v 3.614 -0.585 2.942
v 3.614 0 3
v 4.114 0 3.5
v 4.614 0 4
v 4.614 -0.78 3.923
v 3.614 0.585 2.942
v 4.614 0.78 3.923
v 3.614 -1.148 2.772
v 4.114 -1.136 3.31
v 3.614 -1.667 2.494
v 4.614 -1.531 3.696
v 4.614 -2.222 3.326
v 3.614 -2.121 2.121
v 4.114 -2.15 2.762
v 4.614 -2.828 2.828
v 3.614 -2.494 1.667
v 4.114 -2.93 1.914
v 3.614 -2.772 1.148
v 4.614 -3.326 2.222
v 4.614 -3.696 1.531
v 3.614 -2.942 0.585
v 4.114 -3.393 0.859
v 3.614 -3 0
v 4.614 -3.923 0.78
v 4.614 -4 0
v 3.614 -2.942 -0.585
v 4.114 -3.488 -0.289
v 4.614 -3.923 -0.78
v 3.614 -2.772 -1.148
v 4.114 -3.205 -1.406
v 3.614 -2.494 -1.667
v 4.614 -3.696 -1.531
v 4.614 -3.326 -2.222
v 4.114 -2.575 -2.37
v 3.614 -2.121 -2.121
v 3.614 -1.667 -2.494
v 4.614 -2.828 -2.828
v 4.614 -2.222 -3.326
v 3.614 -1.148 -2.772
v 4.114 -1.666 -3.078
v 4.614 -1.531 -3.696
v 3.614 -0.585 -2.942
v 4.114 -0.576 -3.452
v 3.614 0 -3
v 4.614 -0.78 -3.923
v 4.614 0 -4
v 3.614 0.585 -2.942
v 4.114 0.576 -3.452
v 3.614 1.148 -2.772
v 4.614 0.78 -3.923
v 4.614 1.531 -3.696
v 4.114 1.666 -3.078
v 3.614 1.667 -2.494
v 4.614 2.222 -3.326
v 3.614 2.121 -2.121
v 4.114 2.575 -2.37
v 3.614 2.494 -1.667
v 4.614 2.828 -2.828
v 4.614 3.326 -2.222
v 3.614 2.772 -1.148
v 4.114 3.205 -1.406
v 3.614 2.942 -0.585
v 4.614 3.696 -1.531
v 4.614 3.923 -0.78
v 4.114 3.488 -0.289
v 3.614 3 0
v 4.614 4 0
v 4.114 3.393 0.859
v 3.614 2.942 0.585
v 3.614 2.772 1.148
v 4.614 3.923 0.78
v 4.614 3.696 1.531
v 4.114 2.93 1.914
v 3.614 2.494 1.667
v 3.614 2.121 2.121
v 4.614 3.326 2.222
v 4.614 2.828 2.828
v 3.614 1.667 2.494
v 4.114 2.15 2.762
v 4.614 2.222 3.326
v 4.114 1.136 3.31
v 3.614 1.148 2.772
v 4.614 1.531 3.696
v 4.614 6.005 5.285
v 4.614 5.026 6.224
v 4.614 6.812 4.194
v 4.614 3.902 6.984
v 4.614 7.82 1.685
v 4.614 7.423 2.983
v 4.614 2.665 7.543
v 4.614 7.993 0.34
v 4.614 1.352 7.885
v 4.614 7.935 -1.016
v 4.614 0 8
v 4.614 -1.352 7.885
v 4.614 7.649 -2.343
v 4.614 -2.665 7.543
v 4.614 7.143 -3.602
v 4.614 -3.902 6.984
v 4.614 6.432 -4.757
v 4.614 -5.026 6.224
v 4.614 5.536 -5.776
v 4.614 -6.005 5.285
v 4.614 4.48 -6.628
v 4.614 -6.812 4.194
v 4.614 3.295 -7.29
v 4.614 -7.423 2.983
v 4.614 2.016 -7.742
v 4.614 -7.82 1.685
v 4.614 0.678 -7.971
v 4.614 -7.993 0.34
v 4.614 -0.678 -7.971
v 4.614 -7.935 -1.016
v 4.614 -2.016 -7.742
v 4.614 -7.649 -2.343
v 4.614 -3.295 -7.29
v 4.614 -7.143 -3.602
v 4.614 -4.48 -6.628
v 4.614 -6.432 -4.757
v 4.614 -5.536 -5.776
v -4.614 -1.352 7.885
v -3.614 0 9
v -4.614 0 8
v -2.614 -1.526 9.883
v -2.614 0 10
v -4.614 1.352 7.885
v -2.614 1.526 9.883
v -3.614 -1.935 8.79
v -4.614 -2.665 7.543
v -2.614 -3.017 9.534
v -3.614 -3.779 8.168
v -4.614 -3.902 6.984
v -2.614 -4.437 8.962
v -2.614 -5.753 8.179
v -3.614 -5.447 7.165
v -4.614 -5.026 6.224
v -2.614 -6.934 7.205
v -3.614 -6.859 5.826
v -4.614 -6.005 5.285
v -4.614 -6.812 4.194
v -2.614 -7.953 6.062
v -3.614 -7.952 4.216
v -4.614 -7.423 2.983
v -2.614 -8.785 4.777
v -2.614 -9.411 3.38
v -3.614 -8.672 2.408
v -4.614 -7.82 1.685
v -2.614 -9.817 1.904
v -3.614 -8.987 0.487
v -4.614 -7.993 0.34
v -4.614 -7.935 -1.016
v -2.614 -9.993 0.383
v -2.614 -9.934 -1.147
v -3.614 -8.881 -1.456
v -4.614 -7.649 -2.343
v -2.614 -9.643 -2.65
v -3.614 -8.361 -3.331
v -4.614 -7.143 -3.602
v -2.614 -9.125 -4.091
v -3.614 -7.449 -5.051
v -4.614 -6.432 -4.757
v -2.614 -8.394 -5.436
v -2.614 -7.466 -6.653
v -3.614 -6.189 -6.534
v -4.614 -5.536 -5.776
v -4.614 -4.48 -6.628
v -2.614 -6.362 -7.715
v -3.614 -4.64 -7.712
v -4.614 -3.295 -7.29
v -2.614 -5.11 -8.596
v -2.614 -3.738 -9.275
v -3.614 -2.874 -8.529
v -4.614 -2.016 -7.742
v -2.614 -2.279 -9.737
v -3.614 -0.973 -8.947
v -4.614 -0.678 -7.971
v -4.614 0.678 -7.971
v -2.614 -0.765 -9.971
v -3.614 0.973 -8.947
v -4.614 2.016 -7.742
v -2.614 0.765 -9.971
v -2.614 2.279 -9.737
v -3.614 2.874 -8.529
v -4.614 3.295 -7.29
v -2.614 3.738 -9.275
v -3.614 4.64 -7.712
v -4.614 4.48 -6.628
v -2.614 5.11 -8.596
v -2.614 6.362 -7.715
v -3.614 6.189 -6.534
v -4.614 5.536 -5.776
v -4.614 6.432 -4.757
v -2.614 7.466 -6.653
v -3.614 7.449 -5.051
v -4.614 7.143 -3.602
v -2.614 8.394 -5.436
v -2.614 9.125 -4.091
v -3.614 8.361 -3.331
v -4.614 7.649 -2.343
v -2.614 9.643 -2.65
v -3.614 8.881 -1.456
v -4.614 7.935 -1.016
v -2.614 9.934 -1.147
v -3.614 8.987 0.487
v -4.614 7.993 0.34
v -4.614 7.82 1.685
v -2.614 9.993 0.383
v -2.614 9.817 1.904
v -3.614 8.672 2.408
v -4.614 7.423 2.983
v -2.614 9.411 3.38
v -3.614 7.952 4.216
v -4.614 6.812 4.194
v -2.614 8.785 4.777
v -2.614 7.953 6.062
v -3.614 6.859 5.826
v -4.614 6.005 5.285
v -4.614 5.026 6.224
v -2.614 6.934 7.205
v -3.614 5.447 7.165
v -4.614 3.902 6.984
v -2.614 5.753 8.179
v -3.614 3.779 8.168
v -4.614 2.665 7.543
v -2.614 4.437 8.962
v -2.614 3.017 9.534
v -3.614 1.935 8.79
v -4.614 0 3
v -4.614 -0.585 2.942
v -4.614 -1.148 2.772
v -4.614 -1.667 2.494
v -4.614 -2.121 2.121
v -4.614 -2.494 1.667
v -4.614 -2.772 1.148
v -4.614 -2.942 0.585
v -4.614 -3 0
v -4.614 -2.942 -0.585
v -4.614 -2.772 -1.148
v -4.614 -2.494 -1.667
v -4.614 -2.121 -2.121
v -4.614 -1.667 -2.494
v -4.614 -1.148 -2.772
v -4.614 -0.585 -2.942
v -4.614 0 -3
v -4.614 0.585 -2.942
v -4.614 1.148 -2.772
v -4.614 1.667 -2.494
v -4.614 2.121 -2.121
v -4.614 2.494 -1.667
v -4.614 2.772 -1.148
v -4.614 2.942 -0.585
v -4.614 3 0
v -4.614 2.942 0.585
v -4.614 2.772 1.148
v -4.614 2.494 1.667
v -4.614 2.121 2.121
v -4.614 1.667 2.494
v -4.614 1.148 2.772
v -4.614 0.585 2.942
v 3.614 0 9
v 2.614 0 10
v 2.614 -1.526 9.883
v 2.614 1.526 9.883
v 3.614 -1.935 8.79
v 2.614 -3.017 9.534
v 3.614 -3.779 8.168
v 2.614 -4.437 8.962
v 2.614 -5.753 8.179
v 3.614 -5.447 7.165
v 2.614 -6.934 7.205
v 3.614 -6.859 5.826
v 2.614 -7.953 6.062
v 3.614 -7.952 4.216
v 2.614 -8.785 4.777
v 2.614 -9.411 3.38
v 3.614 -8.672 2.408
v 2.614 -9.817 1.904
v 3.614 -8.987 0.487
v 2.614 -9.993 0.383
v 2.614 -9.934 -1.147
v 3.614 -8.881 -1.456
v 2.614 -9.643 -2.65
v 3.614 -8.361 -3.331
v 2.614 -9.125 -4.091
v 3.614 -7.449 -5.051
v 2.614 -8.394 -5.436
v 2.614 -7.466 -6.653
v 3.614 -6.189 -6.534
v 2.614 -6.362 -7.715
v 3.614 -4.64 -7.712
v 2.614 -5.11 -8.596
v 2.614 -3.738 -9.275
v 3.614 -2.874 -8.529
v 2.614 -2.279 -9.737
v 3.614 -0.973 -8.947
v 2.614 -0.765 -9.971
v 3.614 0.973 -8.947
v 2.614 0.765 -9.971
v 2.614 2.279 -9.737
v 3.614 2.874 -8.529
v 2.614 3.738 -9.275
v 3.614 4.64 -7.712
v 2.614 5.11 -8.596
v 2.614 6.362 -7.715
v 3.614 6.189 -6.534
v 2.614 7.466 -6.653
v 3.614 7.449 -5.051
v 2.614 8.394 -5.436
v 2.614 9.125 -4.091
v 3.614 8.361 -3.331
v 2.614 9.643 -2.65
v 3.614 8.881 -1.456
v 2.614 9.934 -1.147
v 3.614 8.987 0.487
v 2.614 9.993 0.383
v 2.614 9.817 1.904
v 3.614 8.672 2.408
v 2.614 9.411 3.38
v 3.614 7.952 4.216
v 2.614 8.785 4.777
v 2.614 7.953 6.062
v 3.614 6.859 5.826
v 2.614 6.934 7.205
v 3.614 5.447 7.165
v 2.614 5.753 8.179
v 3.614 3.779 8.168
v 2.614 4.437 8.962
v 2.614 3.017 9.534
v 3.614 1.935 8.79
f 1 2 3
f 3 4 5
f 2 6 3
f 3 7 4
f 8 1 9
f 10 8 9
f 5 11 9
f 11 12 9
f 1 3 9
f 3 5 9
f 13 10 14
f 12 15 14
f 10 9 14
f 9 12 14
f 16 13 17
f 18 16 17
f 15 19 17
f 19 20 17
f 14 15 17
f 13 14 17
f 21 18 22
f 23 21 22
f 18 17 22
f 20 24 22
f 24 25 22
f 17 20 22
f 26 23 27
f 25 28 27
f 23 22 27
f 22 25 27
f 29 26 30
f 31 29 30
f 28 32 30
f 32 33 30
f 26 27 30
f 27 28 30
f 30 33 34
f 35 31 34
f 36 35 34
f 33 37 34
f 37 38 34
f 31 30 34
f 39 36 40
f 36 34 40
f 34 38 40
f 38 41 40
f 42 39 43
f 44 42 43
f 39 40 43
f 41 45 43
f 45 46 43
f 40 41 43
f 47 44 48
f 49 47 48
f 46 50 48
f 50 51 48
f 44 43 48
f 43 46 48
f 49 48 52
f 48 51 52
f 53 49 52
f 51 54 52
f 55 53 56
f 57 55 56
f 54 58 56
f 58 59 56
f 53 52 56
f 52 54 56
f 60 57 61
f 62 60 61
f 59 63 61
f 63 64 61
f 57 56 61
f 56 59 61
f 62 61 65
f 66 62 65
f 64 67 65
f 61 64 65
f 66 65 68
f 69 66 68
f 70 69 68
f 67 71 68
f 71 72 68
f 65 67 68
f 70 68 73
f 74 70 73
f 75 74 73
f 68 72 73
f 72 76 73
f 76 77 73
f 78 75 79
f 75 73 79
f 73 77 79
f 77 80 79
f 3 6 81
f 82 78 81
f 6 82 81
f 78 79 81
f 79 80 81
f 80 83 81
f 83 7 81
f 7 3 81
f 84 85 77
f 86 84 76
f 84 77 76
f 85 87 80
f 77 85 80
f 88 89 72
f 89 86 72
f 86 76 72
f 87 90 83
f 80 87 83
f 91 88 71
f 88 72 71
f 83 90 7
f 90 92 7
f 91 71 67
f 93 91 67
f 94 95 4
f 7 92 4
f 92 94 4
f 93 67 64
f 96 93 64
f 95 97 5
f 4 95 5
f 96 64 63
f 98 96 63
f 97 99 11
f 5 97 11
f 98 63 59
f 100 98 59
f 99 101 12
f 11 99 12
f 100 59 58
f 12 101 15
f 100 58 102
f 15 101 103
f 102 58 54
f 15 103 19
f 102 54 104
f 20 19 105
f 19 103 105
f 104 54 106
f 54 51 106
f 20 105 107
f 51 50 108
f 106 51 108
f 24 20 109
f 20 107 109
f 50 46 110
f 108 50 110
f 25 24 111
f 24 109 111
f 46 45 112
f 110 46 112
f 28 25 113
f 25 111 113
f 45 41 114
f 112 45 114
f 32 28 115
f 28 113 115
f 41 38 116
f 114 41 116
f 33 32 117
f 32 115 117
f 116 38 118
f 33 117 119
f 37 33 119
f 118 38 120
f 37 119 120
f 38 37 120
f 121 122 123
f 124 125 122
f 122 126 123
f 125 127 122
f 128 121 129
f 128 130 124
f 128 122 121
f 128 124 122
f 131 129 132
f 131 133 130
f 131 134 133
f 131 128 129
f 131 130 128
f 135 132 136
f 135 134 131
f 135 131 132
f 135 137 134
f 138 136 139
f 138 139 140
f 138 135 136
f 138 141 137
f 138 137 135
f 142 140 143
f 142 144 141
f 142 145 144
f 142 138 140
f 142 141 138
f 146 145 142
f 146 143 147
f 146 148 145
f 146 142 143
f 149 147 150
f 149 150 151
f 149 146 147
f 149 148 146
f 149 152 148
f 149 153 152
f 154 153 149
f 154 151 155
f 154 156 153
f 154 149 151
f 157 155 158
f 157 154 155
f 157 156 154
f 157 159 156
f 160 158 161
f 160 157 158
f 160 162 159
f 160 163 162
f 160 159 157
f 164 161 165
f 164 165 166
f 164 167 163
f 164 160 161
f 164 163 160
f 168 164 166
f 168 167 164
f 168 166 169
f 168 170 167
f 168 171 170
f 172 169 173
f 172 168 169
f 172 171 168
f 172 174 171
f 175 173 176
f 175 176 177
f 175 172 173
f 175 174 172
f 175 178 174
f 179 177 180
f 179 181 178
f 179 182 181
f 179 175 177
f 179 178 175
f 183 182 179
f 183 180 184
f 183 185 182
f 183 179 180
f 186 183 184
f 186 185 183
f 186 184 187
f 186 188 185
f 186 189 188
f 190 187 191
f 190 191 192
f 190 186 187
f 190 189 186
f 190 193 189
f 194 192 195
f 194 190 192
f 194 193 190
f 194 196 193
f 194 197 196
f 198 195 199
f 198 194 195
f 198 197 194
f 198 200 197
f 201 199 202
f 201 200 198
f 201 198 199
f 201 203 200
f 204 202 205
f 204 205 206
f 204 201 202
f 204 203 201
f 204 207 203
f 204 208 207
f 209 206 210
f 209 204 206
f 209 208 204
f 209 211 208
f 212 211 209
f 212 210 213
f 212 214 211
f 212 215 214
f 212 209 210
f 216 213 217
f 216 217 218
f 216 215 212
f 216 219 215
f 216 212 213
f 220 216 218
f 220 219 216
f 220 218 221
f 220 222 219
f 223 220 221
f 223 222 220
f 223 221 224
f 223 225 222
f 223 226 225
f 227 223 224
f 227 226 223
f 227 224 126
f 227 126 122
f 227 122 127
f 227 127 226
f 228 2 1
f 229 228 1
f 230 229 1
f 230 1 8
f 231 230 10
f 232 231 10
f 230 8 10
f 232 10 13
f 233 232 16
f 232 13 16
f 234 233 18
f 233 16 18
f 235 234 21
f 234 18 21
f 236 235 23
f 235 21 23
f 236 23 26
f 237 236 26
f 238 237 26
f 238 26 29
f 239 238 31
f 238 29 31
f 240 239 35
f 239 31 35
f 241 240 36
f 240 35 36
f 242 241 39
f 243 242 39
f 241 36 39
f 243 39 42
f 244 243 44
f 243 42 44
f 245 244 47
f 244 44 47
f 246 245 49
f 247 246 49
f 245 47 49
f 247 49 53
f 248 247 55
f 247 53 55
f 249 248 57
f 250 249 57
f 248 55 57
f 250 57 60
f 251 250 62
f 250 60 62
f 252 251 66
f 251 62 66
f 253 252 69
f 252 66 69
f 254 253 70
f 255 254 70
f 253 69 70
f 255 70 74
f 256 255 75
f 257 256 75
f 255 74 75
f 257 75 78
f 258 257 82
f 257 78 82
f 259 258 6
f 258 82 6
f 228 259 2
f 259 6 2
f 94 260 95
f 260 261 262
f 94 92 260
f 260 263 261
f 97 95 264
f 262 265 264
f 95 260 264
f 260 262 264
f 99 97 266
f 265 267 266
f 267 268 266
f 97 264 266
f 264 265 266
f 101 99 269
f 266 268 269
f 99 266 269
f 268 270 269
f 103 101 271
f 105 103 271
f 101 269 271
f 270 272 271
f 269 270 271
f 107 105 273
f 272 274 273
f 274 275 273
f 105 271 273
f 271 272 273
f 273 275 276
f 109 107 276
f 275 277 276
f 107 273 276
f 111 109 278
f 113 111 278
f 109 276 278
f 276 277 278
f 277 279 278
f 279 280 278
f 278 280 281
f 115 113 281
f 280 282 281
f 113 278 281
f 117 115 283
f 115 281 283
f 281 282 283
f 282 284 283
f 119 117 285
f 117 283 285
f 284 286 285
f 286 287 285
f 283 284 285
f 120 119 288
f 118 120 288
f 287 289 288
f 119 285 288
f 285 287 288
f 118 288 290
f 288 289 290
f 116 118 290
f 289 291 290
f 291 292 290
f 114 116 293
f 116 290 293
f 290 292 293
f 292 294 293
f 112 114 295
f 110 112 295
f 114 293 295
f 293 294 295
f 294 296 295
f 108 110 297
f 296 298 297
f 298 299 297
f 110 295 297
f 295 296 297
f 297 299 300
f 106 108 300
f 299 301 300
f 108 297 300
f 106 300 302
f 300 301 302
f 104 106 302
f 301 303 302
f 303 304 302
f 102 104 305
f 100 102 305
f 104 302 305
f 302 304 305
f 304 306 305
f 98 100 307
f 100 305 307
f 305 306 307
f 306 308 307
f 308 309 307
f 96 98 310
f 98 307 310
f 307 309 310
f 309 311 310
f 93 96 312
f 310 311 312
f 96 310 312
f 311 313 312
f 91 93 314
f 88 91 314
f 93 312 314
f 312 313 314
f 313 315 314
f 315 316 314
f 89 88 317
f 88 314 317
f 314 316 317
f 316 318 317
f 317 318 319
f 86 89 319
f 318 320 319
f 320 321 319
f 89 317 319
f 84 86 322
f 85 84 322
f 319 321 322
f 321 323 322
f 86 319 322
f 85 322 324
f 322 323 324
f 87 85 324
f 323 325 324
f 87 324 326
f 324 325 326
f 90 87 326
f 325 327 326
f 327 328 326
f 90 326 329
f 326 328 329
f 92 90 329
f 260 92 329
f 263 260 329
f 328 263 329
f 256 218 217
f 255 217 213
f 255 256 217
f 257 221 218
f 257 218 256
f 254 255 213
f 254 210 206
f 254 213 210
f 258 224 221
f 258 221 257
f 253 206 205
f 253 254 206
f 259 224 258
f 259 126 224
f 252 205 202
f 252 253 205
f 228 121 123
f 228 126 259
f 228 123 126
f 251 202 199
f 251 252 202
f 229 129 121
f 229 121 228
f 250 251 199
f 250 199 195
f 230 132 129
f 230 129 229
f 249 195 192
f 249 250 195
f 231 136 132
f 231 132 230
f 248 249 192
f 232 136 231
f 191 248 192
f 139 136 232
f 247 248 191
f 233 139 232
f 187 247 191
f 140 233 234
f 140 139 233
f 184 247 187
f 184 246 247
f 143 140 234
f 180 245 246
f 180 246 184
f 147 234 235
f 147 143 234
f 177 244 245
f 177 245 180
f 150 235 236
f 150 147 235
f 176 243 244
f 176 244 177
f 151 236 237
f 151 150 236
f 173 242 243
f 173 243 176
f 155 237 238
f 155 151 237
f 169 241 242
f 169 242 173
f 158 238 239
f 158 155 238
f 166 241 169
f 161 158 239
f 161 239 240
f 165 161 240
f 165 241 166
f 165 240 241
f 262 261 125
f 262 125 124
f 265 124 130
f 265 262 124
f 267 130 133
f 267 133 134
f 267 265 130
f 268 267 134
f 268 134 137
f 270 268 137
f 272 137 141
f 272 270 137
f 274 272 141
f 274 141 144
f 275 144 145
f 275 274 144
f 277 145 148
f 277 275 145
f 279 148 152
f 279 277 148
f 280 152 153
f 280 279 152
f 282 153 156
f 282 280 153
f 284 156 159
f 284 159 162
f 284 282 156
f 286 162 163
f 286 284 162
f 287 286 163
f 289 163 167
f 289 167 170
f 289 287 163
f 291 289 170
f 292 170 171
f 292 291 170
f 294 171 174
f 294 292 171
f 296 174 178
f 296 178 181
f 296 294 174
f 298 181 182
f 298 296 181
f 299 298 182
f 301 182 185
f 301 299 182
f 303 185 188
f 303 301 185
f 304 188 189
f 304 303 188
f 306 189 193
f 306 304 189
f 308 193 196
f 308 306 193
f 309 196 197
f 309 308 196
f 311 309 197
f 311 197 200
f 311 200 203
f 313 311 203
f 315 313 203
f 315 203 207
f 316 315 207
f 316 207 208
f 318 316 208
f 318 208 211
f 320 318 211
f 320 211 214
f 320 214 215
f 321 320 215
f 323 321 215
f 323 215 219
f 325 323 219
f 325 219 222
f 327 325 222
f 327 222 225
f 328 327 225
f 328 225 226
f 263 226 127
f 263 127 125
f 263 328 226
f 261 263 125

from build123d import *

# Parameters (mm, degrees)
F0_W    = 9.227068
F0_H    = 7
F2_SIZE = 2
F3_SIZE = 1


with BuildPart() as f1:
    # F0 (on Front) → F1 (revolve)
    with BuildSketch(Plane.XZ):
        with Locations((0, 6.5)):
            Rectangle(F0_W, F0_H)
    revolve(axis=Axis((0.183192, 0, 0), (1, 0, 0)))

    # F2
    f2_edges = [f1.edges().sort_by_distance(p)[0] for p in [
        (-4.613534, 0, -10),
        (4.613534, 0, -10),
    ]]
    chamfer(f2_edges, length=F2_SIZE)

    # F3
    f3_edges = [f1.edges().sort_by_distance(p)[0] for p in [
        (4.613534, 0, -3),
    ]]
    chamfer(f3_edges, length=F3_SIZE)


solid = f1.part
